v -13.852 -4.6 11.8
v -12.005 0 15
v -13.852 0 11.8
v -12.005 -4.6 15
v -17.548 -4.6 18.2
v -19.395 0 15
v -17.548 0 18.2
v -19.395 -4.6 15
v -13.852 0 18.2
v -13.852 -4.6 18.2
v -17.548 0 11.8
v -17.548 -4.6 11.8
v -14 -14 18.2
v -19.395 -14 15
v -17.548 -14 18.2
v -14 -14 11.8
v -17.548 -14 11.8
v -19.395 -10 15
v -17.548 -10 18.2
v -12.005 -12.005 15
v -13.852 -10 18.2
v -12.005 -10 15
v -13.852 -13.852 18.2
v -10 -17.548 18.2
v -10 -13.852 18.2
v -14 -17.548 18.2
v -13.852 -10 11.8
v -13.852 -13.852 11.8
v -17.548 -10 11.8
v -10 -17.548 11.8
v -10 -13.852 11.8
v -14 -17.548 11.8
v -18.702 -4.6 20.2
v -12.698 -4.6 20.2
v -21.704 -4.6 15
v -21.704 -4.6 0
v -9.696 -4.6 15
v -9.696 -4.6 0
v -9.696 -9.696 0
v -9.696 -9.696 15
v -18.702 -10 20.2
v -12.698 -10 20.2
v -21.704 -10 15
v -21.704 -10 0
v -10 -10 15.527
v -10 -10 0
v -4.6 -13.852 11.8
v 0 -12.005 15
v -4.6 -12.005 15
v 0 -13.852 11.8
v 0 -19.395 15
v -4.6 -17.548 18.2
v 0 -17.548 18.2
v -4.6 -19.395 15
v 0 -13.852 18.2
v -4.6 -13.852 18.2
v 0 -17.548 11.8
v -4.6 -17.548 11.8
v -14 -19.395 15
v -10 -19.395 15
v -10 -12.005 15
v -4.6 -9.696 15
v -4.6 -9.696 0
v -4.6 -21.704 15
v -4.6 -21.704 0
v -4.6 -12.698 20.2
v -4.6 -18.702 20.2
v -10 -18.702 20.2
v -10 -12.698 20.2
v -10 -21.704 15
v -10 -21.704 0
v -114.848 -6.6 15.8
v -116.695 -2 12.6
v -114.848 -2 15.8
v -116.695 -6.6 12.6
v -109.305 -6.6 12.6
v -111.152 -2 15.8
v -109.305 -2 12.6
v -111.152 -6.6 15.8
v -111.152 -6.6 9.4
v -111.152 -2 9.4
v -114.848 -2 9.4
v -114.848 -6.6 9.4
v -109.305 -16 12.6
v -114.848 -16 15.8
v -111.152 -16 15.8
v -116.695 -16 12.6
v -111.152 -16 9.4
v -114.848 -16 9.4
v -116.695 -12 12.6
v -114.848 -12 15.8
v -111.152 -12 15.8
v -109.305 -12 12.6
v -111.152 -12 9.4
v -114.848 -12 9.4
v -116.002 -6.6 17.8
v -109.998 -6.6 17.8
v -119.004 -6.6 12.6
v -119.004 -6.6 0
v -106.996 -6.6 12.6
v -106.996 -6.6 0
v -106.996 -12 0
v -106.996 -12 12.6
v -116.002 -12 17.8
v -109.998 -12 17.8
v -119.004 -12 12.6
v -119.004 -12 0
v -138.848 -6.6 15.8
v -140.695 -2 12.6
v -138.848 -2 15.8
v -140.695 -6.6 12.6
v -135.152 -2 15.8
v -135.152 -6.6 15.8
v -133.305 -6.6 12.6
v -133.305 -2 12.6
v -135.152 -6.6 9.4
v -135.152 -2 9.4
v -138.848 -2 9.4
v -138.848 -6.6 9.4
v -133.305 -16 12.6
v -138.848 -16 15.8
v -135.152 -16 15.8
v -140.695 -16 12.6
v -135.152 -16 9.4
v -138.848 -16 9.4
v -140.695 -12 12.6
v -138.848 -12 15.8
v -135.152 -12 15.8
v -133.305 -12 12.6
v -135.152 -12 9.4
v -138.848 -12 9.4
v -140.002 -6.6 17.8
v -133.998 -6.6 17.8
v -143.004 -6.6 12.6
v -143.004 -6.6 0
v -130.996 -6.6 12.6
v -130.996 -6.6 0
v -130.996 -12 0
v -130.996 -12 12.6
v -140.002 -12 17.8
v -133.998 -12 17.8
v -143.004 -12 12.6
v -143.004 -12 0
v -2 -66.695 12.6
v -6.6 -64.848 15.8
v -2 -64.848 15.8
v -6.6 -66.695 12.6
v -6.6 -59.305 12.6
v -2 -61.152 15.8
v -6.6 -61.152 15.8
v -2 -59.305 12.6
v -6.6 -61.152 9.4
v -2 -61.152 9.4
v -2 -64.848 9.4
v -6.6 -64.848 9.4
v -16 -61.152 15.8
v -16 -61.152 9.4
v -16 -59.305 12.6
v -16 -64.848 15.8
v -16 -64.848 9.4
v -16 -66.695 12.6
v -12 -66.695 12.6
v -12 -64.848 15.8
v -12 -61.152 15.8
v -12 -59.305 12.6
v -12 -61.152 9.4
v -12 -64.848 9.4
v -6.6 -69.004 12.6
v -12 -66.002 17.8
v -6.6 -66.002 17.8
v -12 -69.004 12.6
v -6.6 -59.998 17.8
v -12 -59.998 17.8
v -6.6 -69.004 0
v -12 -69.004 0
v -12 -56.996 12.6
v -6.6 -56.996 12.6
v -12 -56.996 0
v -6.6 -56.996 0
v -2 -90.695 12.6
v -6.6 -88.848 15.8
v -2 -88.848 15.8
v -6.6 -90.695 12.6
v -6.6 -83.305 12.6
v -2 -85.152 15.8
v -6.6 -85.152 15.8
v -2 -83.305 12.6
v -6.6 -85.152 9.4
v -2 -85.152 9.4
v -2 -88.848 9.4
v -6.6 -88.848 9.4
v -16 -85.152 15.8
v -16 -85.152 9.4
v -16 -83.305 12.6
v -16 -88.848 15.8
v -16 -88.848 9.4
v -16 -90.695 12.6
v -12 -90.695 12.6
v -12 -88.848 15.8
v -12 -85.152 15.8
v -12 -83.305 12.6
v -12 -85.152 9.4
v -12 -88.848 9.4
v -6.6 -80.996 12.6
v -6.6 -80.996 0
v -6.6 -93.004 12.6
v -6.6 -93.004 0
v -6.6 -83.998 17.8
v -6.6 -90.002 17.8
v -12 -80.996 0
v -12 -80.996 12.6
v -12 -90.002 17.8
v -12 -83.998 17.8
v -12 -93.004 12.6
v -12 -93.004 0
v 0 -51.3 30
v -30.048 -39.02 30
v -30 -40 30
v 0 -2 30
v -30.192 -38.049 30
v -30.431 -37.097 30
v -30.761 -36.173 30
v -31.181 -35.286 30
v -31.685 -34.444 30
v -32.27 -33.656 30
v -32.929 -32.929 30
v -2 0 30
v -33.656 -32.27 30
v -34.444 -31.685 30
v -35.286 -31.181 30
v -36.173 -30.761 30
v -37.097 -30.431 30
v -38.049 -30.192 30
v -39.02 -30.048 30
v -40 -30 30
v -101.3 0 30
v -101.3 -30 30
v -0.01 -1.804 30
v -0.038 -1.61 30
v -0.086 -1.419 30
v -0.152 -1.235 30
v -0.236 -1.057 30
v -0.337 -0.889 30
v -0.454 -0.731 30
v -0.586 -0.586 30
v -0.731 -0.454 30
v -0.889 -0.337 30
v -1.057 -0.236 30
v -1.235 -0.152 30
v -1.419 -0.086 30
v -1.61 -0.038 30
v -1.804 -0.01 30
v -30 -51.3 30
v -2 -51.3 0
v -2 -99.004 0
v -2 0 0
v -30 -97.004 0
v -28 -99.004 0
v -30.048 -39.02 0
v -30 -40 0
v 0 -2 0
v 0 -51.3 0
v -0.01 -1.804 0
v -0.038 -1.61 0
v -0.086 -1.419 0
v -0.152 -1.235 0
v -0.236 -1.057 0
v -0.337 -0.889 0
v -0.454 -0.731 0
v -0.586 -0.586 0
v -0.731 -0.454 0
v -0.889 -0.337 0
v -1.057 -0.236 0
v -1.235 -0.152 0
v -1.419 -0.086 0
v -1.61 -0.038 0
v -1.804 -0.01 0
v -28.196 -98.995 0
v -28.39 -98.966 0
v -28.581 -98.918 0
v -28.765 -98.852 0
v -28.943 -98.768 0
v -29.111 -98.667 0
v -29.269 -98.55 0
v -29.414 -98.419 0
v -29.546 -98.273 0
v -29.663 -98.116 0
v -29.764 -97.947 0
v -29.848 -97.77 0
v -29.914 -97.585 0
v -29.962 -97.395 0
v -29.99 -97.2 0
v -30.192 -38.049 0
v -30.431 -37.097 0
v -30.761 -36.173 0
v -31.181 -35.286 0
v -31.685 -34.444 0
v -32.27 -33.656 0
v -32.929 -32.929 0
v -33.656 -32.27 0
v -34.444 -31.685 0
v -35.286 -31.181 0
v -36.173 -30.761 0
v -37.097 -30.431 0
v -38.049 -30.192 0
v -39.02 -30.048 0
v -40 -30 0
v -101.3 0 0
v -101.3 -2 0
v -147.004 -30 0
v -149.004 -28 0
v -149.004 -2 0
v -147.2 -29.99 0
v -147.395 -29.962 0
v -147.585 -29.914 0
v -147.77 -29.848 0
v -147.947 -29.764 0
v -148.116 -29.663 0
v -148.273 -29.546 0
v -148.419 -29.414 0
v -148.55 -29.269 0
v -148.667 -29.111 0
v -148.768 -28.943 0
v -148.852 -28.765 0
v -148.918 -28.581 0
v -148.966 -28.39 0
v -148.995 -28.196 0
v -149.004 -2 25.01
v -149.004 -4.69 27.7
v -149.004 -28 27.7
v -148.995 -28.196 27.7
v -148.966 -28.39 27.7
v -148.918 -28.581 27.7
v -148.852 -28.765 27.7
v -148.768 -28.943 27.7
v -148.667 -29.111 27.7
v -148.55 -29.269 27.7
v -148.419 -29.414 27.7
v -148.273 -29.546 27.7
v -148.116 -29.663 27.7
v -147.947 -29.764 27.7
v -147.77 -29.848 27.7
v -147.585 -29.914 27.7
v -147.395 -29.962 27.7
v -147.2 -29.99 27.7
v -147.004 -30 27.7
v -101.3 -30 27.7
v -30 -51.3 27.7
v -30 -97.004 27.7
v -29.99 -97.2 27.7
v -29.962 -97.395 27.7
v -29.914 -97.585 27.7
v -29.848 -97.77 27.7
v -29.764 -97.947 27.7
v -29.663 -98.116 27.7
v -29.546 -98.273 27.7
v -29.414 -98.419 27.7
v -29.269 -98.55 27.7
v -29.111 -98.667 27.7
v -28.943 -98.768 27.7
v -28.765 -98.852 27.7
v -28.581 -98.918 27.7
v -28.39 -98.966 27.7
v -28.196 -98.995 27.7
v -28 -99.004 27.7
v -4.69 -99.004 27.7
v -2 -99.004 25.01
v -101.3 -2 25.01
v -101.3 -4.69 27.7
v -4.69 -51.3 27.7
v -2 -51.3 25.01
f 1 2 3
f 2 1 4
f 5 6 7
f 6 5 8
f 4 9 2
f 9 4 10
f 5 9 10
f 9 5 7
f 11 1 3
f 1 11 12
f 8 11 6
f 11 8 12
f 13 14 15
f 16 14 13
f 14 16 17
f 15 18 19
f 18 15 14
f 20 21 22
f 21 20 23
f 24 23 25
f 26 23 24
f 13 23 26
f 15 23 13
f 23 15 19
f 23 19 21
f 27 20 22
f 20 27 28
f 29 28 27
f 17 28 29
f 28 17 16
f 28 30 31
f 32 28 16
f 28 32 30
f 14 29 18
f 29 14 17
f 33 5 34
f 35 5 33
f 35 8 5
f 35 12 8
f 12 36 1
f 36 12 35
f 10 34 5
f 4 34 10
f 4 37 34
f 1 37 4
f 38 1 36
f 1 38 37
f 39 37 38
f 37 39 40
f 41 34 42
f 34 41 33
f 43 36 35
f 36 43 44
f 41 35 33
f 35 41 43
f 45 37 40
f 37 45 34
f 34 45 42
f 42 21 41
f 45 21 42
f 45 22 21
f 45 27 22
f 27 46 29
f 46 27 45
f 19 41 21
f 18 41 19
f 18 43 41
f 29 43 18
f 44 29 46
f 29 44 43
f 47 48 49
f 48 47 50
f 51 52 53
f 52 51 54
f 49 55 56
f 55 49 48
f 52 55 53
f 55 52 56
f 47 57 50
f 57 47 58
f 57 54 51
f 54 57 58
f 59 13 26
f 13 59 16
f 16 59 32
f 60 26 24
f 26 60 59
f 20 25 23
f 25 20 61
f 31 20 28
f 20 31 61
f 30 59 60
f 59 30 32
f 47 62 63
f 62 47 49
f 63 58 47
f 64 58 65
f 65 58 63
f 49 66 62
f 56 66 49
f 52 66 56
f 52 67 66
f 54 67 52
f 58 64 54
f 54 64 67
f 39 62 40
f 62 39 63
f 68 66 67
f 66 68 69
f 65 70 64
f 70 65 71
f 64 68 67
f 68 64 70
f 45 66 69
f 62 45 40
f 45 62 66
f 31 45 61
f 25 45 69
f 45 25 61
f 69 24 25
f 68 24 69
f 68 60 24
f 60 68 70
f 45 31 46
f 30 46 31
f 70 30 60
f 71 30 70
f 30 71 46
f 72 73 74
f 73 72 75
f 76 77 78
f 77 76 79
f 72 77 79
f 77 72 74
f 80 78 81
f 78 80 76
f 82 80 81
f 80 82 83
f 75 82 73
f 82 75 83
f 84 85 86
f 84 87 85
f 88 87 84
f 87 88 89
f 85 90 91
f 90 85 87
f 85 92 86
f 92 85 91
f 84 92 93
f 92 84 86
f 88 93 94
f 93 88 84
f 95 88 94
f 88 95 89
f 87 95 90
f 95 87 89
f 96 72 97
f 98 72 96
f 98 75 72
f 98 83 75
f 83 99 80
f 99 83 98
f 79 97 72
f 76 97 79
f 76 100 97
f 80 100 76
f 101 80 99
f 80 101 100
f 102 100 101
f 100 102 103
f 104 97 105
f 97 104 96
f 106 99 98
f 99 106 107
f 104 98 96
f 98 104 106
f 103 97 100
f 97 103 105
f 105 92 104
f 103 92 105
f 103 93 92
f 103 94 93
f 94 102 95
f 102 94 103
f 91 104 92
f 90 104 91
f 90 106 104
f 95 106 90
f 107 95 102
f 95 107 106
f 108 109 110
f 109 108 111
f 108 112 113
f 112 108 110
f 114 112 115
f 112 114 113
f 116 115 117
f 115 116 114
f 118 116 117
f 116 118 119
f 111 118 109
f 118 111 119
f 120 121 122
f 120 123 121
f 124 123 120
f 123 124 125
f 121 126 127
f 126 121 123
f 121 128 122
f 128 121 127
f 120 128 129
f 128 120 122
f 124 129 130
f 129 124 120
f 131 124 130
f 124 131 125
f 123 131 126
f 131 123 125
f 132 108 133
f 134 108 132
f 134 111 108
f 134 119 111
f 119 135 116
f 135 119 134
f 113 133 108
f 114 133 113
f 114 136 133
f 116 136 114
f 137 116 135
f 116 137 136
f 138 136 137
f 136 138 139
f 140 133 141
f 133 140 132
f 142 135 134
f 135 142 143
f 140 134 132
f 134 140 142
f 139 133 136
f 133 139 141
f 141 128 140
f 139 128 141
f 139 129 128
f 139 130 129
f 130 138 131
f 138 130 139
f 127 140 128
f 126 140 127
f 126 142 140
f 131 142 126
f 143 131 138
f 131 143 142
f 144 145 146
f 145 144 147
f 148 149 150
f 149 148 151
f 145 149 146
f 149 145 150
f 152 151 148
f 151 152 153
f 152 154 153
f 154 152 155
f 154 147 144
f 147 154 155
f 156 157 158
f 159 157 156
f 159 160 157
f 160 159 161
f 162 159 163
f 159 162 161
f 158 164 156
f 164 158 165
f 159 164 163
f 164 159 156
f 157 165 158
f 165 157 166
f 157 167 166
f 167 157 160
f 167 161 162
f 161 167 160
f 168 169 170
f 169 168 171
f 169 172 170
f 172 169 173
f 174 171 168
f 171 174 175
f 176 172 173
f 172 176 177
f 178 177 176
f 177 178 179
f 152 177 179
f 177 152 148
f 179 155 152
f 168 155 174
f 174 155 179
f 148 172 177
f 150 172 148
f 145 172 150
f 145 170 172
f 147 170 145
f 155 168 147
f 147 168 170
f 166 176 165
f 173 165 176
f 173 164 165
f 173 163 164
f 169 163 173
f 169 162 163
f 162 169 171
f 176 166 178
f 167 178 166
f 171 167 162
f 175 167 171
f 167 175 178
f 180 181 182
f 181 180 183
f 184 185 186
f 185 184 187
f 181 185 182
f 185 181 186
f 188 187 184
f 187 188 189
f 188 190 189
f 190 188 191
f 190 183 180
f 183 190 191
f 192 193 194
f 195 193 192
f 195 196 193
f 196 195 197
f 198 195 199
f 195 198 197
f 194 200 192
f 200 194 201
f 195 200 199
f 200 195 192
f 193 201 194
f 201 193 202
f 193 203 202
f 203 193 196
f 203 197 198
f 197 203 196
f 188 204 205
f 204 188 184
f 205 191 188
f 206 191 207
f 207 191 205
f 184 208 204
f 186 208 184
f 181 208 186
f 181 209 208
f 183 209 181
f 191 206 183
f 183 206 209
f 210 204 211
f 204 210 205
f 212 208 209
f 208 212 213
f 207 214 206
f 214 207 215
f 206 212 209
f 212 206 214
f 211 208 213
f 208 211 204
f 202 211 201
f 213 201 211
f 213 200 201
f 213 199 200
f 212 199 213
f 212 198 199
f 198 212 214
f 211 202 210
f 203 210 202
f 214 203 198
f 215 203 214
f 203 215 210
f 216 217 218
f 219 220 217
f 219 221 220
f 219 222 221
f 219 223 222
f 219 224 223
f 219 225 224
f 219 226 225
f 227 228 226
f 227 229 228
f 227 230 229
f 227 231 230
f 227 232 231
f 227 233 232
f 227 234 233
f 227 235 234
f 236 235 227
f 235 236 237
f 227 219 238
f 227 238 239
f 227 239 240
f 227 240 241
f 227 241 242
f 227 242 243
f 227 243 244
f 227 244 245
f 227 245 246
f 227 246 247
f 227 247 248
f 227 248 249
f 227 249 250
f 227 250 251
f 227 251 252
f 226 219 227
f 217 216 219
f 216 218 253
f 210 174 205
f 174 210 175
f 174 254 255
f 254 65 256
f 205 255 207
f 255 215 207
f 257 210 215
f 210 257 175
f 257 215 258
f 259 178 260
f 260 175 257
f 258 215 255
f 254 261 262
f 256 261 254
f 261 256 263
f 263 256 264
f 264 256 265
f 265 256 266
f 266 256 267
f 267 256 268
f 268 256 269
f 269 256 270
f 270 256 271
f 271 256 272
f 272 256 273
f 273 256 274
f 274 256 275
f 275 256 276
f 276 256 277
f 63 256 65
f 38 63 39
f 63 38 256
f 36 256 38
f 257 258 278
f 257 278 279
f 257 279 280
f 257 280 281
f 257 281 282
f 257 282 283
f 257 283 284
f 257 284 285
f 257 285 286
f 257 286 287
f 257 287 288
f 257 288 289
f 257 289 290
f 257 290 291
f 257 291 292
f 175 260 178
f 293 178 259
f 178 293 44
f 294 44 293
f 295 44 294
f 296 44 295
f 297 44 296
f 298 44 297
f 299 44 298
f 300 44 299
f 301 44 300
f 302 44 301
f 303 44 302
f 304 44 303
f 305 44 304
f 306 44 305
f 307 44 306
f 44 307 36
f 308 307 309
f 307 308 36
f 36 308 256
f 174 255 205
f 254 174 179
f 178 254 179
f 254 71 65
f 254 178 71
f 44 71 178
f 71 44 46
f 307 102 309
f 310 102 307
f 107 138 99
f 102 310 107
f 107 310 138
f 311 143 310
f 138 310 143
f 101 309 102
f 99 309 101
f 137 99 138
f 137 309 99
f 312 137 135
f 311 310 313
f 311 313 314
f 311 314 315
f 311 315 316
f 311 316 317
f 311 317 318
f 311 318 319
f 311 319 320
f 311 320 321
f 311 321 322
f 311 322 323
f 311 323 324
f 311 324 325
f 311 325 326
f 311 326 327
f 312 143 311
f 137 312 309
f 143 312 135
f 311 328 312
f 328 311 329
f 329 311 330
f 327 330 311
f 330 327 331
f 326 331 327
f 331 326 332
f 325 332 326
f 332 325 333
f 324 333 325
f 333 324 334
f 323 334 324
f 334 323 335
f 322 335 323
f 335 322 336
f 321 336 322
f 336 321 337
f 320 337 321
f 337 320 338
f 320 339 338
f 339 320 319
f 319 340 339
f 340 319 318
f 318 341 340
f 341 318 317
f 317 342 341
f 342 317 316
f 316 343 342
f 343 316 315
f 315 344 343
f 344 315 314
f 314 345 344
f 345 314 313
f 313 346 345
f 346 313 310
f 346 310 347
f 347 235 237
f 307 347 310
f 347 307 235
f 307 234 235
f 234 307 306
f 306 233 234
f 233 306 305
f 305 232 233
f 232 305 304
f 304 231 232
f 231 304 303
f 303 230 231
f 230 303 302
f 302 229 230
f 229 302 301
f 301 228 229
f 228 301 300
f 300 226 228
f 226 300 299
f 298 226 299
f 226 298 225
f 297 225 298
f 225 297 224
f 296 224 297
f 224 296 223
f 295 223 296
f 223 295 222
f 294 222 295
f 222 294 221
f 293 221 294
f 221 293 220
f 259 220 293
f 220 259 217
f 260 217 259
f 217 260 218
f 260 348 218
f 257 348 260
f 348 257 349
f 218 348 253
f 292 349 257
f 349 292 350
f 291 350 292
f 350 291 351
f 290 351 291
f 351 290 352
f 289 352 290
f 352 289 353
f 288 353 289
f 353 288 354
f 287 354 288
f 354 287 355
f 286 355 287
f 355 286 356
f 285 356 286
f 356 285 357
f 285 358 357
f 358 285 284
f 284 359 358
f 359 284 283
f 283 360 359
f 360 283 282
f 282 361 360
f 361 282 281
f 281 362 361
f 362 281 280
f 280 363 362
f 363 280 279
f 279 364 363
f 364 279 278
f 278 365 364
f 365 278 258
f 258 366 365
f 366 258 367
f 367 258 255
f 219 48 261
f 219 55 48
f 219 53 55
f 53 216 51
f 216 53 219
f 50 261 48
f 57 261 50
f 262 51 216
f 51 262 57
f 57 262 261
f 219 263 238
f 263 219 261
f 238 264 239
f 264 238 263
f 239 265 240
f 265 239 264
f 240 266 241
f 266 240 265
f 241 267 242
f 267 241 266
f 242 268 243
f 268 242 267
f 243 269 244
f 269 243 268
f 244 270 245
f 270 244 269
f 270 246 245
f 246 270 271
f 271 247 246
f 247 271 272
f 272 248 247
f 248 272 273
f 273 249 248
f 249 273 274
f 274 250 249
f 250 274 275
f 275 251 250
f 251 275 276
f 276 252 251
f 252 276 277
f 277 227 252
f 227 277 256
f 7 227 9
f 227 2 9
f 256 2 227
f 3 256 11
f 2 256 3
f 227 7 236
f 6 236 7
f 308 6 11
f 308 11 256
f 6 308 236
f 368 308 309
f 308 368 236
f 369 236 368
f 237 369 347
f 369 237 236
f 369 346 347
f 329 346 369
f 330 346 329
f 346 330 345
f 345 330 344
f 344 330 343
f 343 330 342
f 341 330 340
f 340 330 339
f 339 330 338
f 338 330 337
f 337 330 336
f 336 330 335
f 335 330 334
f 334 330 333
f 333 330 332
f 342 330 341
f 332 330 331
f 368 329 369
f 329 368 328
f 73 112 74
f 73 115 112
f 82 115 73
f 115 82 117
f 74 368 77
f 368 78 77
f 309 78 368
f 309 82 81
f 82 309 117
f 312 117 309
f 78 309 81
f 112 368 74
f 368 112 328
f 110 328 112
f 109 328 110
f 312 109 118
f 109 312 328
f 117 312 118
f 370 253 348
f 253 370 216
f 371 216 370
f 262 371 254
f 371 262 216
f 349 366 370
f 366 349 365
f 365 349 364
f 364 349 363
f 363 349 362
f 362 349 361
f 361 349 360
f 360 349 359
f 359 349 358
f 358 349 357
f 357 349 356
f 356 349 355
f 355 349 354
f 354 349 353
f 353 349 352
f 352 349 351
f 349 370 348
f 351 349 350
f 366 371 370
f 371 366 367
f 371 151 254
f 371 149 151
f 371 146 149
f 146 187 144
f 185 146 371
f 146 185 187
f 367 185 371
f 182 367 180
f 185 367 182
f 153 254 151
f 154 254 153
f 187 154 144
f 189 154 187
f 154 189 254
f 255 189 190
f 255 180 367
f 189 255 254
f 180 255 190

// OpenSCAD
// file: ../../../../modules/steel_rack.scad
use <bolts.scad>;

bolt_edge_offset = 15;
bolt_positions = [
  bolt_edge_offset,
  bolt_edge_offset + 98,
  bolt_edge_offset + 98 + 24,
];

module bolt_and_nut(y, h) {
  nut_thickness = 5;
  translate([0, y, h / 2])
    m6_bolt_hole(h + 1, center = true);
  translate([0, y, h - nut_thickness / 2])
    rotate([0, 0, 90])
    m6_nut_trap(nut_thickness, center = true);
}

module long_bar(w, y, h) {
  difference() {
    translate([w / 2, y / 2, h / 2])
      cube([w, y, h], center = true);

    for (x = bolt_positions) {
      translate([x, 0, 0])
        bolt_and_nut(y / 2, h);
    }
  }
}

module short_bar(w, y, h) {
  difference() {
    translate([w / 2, y / 2, h / 2])
      cube([w, y, h], center = true);

    translate([bolt_positions[0], 0, 0])
      bolt_and_nut(y / 2, h);
  }
}

module fillet_profile(r, h) {
  linear_extrude(height = h, center = true)
    difference() {
      square([r, r]);
      circle(r = r, $fn = 64);
    }
}
// file: ../../../../modules/slide_rail_outer_bracket.scad
use <bolts.scad>
use <steel_rack.scad>

// スライドレール外側とL字アングルを接合するL字ブラケット。
// 設計の経緯と確定値は ledger/designs/steel-rack-500x400.md が正本。
//
// 座標系 (部品自身の datum):
//   X = 0 がこの部品側のL字アングル外側面。部品はアングル板厚の内側から始まる
//   Y = 0 がスライドレール外側面。+Y がラック外側
//   Z = 0 が部品底面 (レール下端と一致)
// front は screw_x = [37, 101.5]、rear は [79.5, 176] を自分の datum
// から渡す。 M6 が高さ 22.5±12 の対称配置のため部品は Z 反転対称になり、
// 左右のレールにも上下反転するだけで同じ2部品を使い回せる。

bracket_height = 45;
flange_t = 10; // 短辺 (X方向厚) の厚さ
// 長辺 (Y方向厚) の厚さ。旧断面は flange_t=10 を共用していたが、レール面を
// rail_offset 分外へ出すと M6 ナット挿入口が長辺と重なるため 2mm 削った
// (10→8、user決定)。ナット六角の内縁 (y=8.000) と長辺外面がツライチになる
arm_t = 8;
// レール接触面のラック外側オフセット。組付け実測でレール間隔が 385mm しか
// なくケース 412mm が入らないため、(412 - 385) / 2 + 0.5 = 14mm ずつ
// 各レールを外側へ移す (user指示)。M6 実穴は既に開いており位置を変えられない
rail_offset = 14;
inner_r = 4;
m6_z = [ 10.5, 34.5 ];
// クリアランス基準: 呼び寸法 + 0.4mm (実プリントの嵌合結果から拡大)
m6_pass_flat = 6.4; // M6ボルト通し六角の二面幅 (手前5mm)
m6_nut_flat = 10.4; // M6ナット窪み六角の二面幅 (奥5mm、ナット実測9.8 + 実効0.6)
m6_stage_depth = 5;
screw_z = 22.5;
m4_pass_flat = 4.4; // M4小トラスネジ通し六角の二面幅
m4_nut_flat = 7.4; // M4ナット窪み六角の二面幅 (ナット実測6.8 + 実効0.6)
m4_nut_depth = 2.8; // M4ナット窪みの深さ (user指定)
edge_margin = 8; // 穴の外縁から部品端までの余白 (自由な辺のみ)
angle_t = 2.2; // L字アングルの板厚

// 六角プリズム: 軸X・上下の辺が水平 (flat-up)。
// 天井を短い水平ブリッジにして垂れの改善を狙う
// (point-up だと天井面が水平から30°になり垂れた — 嵌合試験で確認済み)
module
hex_x_flat_up(flat_d, l)
{
    rotate([ 0, 90, 0 ]) rotate([ 0, 0, 90 ]) hex_hole(flat_d = flat_d, h = l);
}

// 六角プリズム: 軸Y・上下の辺が水平 (flat-up)。M6と同じくブリッジ天井
module
hex_y_flat_up(flat_d, l)
{
    rotate([ 90, 0, 0 ]) hex_hole(flat_d = flat_d, h = l);
}

module
slide_rail_outer_bracket(screw_x, name = "bracket")
{
    // flat-up配置では水平方向の穴半径は対角/2 (= 二面幅/(2*cos30))。
    // 8mm余白の契約はこの実半径に対して守る
    m6_nut_diag = m6_nut_flat / cos(30);
    m4_nut_diag = m4_nut_flat / cos(30);
    // M6中心: 実物のアングルには旧断面 (長辺厚10) の導出値
    // (厚10 + 内側R + 余白 + M6六角対角/2 = 28.0044) で既に穴が開いている。
    // 旧導出式から rail_offset を引くことで M6 実穴と部品外端の絶対位置を
    // 保ったまま、レール接触面 (y=0) だけをラック外側へ 14mm 出す
    m6_y = flange_t + inner_r + edge_margin + m6_nut_diag / 2 - rail_offset;
    short_len = m6_y + m6_nut_diag / 2 + edge_margin;
    // 長辺のX終端: 最奥のM4穴の最大断面 (ナット窪みの対角の半分) + 余白
    arm_end = max(screw_x) + m4_nut_diag / 2 + edge_margin;

    echo(str("CONTRACT ", name, ": height = ", bracket_height));
    echo(str("CONTRACT ", name, ": flange_t = ", flange_t));
    echo(str("CONTRACT ", name, ": arm_t = ", arm_t));
    echo(str("CONTRACT ", name, ": rail_offset = ", rail_offset));
    echo(str("CONTRACT ", name, ": inner_r = ", inner_r));
    echo(str("CONTRACT ", name, ": m6_z = ", m6_z));
    echo(str("CONTRACT ", name, ": m6_pass_flat = ", m6_pass_flat));
    echo(str("CONTRACT ", name, ": m6_nut_flat = ", m6_nut_flat));
    echo(str("CONTRACT ", name, ": screw_z = ", screw_z));
    echo(str("CONTRACT ", name, ": m4_pass_flat = ", m4_pass_flat));
    echo(str("CONTRACT ", name, ": m4_nut_flat = ", m4_nut_flat));
    echo(str("CONTRACT ", name, ": m4_nut_depth = ", m4_nut_depth));
    echo(str("CONTRACT ", name, ": edge_margin = ", edge_margin));
    echo(str("CONTRACT ", name, ": angle_t = ", angle_t));
    echo(str("CONTRACT ", name, ": screw_x = ", screw_x));
    echo(str("CONTRACT ",
             name,
             ": m6_y = ",
             m6_y,
             ", short_len = ",
             short_len,
             ", arm_end = ",
             arm_end));

    // 余白の契約 (自由な辺のみ。高さ45とM6のZはuser固定値なので対象外)。
    // M6ナット六角の内縁 (m6_y - 対角/2 = 8.000) は長辺外面 (y = arm_t) と
    // ツライチで、ナット挿入口が長辺に塞がれない (1e-9 は浮動小数の丸め猶予)
    assert(m6_y - m6_nut_diag / 2 >= arm_t - 1e-9,
           "M6 nut slot is blocked by the arm");
    assert(short_len - (m6_y + m6_nut_diag / 2) >= edge_margin,
           "M6 hole too close to the short-flange edge");
    assert(arm_end - (max(screw_x) + m4_nut_diag / 2) >= edge_margin,
           "M4 hole too close to the arm end");
    assert(min(screw_x) - m4_nut_diag / 2 >= angle_t + flange_t,
           "M4 hole overlaps the short flange");

    difference()
    {
        union()
        {
            // 短辺: アングル内側に当たる縦板 (M6で締結)
            translate([ angle_t, 0, 0 ])
                cube([ flange_t, short_len, bracket_height ]);

            // 長辺: レール外側面に当たる横板 (M4小トラスネジ+ナットで締結)
            translate([ angle_t, 0, 0 ])
                cube([ arm_end - angle_t, arm_t, bracket_height ]);

            // 内側コーナーのR4フィレット (応力集中の回避)
            translate([
                angle_t + flange_t + inner_r,
                arm_t + inner_r,
                bracket_height / 2
            ]) rotate([ 0, 0, 180 ]) fillet_profile(inner_r, bracket_height);
        }

        // M6の2段六角穴 (軸X・flat-up): 手前5mmが通し、奥5mmがナット窪み。
        // ナット窪みは +X へ延長した挿入回廊 (x=7.2..17): 短辺の背面から
        // fillet の掛かる区間を局所カットし、fillet 外端 (x=16.2) を 0.8mm
        // 超えて開放することで M6 ナットを +X 側から真っ直ぐ挿入できる
        // (fillet と挿入経路の干渉分を削るのは user 許容)。
        // 六角の下頂点 (y=8.000) は長辺外面とツライチで、正確な接触は
        // 退化した稜 (非多様体STL) を作るため、hull で 0.2mm 下へ掃引して
        // 長辺外面に浅い逃げ溝を彫る (ナットの嵌合には影響しない)
        slot_start = angle_t + flange_t - m6_stage_depth;
        slot_end = angle_t + flange_t + inner_r + 0.8;
        slot_relief = 0.2;
        for (z = m6_z) {
            translate([ angle_t + m6_stage_depth / 2 - 0.05, m6_y, z ])
                hex_x_flat_up(m6_pass_flat, m6_stage_depth + 0.1);
            translate([ (slot_start + slot_end) / 2, m6_y, z ]) hull()
            {
                hex_x_flat_up(m6_nut_flat, slot_end - slot_start);
                translate([ 0, -slot_relief, 0 ])
                    hex_x_flat_up(m6_nut_flat, slot_end - slot_start);
            }
        }

        // M4小トラスネジの穴 (軸Y・flat-up):
        // 通しは全厚を貫通し、L字の内側面 (y=8) から深さ2.8mmのナット窪み。
        // ネジはレール内側から刺さり
        // (トラス頭はスライダーと干渉しない実測済み)、
        // ナットが窪みの底で受けてレール板とブラケットを共締めする
        for (x = screw_x) {
            translate([ x, arm_t / 2, screw_z ])
                hex_y_flat_up(m4_pass_flat, arm_t + 0.2);
            translate([ x, arm_t - m4_nut_depth / 2 + 0.05, screw_z ])
                hex_y_flat_up(m4_nut_flat, m4_nut_depth + 0.1);
        }
    }
}
// file: ../../../../modules/bolts.scad
module nut_trap(d, h, center = true) {
  linear_extrude(height = h, center = center)
  circle(d = d / cos(30), $fn = 6);
}

module bolt_hole(d, h, center = true) {
  linear_extrude(height = h, center = center)
  circle(d = d, $fn = 64);
}

// Hex holes for self-tapping (nominal - 0.2mm)
module hex_hole(flat_d, h) {
  linear_extrude(height = h, center = true)
  circle(d = flat_d / cos(30), $fn = 6);
}

module m3_bolt_hexhole(h) {
  rotate([0, 0, 90]) hex_hole(flat_d = 2.8, h = h);
}

module m4_bolt_hexhole(h) {
  rotate([0, 0, 90]) hex_hole(flat_d = 3.8, h = h);
}

module m6_bolt_hexhole(h) {
  rotate([0, 0, 90]) hex_hole(flat_d = 5.8, h = h);
}

module m8_bolt_hexhole(h) {
  rotate([0, 0, 90]) hex_hole(flat_d = 7.8, h = h);
}

// M3
module m3_bolt_hole(h, center = false) { bolt_hole(d = 3.4, h = h, center = center); }
module m3_nut_trap(h, center = false) { nut_trap(d = 5.7, h = h, center = center); }

// M4
module m4_bolt_hole(h, center = false) { bolt_hole(d = 4.4, h = h, center = center); }
module m4_nut_trap(h, center = false) { nut_trap(d = 7.5, h = h, center = center); }

// M6
module m6_bolt_hole(h, center = false) { bolt_hole(d = 6.2, h = h, center = center); }
module m6_nut_trap(h, center = false) { nut_trap(d = 10.2, h = h, center = center); }

// M8
module m8_bolt_hole(h, center = false) { bolt_hole(d = 8.4, h = h, center = center); }
module m8_nut_trap(h, center = false) { nut_trap(d = 13.3, h = h, center = center); }
// main file
use <../../../../modules/shelf_frame.scad>

// ケース棚の枠の角。手前右・奥左用（左用の鏡像）。
shelf_frame_corner_print(mirrored = true);
